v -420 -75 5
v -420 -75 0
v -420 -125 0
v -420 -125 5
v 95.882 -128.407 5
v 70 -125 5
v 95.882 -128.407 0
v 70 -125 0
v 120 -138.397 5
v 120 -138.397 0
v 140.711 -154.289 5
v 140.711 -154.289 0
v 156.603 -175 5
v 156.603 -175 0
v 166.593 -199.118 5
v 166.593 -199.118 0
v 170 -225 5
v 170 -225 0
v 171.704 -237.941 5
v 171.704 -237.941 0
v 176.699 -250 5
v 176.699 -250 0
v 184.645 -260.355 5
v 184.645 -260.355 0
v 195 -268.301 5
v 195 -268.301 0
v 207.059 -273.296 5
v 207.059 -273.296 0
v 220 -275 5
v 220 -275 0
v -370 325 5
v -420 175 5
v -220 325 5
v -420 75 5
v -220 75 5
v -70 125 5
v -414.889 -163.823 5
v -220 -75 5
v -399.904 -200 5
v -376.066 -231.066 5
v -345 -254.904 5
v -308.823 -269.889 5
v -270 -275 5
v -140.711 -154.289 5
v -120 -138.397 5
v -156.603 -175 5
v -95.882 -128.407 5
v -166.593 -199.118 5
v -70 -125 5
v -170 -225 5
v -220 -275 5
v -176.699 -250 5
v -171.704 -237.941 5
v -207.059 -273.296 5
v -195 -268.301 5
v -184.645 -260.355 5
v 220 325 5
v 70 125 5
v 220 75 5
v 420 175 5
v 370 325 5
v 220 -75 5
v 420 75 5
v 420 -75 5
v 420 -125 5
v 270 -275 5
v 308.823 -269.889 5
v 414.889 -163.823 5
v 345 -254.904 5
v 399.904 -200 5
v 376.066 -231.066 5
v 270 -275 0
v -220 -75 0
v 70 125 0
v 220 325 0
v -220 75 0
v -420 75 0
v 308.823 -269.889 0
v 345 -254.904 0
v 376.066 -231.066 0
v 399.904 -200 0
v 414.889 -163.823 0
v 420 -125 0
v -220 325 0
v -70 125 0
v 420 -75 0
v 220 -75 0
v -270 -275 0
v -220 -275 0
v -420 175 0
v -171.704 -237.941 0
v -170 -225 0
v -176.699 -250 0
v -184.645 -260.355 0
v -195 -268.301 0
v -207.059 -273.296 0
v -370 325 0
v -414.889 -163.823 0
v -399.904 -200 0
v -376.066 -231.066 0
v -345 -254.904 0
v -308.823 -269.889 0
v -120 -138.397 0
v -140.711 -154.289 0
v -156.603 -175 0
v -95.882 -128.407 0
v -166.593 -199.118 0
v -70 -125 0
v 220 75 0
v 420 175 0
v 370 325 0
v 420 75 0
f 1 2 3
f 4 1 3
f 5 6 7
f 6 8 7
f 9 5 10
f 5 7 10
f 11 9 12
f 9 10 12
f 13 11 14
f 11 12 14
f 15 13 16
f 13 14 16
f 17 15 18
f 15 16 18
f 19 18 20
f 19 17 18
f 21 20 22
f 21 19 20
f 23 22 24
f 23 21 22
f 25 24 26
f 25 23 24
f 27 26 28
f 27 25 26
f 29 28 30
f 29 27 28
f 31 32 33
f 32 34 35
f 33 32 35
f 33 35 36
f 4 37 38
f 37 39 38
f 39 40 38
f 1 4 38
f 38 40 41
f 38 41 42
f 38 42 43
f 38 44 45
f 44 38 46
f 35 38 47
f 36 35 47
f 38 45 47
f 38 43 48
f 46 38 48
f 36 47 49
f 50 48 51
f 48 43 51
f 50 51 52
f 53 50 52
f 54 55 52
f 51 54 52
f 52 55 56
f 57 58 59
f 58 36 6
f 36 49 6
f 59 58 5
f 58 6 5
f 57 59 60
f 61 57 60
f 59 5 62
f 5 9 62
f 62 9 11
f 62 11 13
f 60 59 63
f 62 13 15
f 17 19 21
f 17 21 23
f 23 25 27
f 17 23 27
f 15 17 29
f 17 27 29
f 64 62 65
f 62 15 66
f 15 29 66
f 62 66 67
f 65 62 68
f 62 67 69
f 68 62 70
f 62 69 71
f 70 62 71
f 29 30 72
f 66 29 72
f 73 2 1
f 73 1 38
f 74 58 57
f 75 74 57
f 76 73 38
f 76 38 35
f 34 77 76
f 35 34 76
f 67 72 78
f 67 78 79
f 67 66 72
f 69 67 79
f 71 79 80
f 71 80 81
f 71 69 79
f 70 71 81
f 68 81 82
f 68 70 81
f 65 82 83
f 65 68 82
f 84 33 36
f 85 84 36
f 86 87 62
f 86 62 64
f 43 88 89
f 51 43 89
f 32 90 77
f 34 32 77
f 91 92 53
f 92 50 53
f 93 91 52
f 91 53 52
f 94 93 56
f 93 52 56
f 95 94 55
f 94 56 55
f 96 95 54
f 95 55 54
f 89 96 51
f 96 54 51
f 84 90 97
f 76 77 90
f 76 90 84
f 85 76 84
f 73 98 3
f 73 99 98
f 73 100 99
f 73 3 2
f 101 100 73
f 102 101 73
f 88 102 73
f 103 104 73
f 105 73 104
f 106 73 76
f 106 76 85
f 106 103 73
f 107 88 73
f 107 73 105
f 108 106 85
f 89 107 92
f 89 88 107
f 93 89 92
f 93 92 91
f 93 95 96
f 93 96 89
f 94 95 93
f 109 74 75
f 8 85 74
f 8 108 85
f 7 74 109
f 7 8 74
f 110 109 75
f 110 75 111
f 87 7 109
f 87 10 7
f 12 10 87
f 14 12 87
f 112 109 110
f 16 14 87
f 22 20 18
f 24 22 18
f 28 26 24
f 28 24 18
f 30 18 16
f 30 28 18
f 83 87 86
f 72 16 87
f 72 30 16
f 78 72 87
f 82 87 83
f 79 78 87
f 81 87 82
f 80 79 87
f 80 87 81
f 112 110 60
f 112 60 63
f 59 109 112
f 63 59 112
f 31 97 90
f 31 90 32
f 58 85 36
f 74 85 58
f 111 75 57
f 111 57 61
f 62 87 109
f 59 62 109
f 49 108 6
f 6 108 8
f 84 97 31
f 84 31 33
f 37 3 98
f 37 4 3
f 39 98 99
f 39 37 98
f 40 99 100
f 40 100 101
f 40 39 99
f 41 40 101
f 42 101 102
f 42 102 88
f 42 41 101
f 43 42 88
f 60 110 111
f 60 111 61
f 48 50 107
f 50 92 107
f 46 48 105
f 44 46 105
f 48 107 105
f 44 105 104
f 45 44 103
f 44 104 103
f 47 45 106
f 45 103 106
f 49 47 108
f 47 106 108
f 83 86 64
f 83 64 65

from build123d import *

# Parameters (mm, degrees)
F0_W      = 440
F0_H      = 250
F1_DEPTH  = 5
F2_W      = 250
F2_H      = 200
F2_W_2    = 350
F2_H_2    = 250
F3_DEPTH  = 5
F4_R      = 150
F5_R      = 100
F6_R      = 49.99999
F7_SIZE2  = 150
F7_SIZE   = 50
F8_SIZE2  = 50
F8_SIZE   = 150
F10_DEPTH = 25


# Not quite as in the source:
# - a fillet or chamfer is up to 0.001 mm smaller than in the source, because OpenCascade refuses the exact size


with BuildPart() as f1:
    # F0 (on Top) → F1 (new body)
    with BuildSketch(Plane.XY):
        Rectangle(F0_W, F0_H)
    extrude(amount=F1_DEPTH)

    # F2 (on face) → F3 (join)
    with BuildSketch(Plane(origin=(0, 0, 0), x_dir=(1, 0, 0), z_dir=(0, 0, -1))):
        with Locations((-295, 175)):
            Rectangle(F2_W, F2_H)
        with Locations((295, 175)):
            Rectangle(F2_W, F2_H)
        with Locations((-245, -200)):
            Rectangle(F2_W_2, F2_H_2)
        with Locations((245, -200)):
            Rectangle(F2_W_2, F2_H_2)
    extrude(amount=-F3_DEPTH)

    # F4
    f4_edges = [f1.edges().sort_by_distance(p)[0] for p in [
        (-420, -275, 2.5),
        (420, -275, 2.5),
    ]]
    fillet(f4_edges, radius=F4_R)

    # F5
    f5_edges = [f1.edges().sort_by_distance(p)[0] for p in [
        (170, -125, 2.5),
        (-170, -125, 2.5),
    ]]
    fillet(f5_edges, radius=F5_R)

    # F6 (radius 50 in the source; OpenCascade refuses exactly that, so slightly less here)
    f6_edges = [f1.edges().sort_by_distance(p)[0] for p in [
        (-170, -275, 2.5),
        (170, -275, 2.5),
    ]]
    fillet(f6_edges, radius=F6_R)

    # F7
    f7_edges = [f1.edges().sort_by_distance(p)[0] for p in [
        (420, 325, 2.5),
    ]]
    f7_side = f1.faces().sort_by_distance((245, 325, 2.5))[0]
    chamfer(f7_edges, length=F7_SIZE, length2=F7_SIZE2, reference=f7_side)

    # F8
    f8_edges = [f1.edges().sort_by_distance(p)[0] for p in [
        (-420, 325, 2.5),
    ]]
    f8_side = f1.faces().sort_by_distance((-420, 200, 2.5))[0]
    chamfer(f8_edges, length=F8_SIZE, length2=F8_SIZE2, reference=f8_side)

    # F9 (on face) → F10 (cut)
    with BuildSketch(Plane.XY.offset(5)):
        Polygon((-220, 325), (-70, 125), (-70, 325), align=None)
        Polygon((70, 325), (70, 125), (220, 325), align=None)
    extrude(amount=-F10_DEPTH, mode=Mode.SUBTRACT)


solid = f1.part
